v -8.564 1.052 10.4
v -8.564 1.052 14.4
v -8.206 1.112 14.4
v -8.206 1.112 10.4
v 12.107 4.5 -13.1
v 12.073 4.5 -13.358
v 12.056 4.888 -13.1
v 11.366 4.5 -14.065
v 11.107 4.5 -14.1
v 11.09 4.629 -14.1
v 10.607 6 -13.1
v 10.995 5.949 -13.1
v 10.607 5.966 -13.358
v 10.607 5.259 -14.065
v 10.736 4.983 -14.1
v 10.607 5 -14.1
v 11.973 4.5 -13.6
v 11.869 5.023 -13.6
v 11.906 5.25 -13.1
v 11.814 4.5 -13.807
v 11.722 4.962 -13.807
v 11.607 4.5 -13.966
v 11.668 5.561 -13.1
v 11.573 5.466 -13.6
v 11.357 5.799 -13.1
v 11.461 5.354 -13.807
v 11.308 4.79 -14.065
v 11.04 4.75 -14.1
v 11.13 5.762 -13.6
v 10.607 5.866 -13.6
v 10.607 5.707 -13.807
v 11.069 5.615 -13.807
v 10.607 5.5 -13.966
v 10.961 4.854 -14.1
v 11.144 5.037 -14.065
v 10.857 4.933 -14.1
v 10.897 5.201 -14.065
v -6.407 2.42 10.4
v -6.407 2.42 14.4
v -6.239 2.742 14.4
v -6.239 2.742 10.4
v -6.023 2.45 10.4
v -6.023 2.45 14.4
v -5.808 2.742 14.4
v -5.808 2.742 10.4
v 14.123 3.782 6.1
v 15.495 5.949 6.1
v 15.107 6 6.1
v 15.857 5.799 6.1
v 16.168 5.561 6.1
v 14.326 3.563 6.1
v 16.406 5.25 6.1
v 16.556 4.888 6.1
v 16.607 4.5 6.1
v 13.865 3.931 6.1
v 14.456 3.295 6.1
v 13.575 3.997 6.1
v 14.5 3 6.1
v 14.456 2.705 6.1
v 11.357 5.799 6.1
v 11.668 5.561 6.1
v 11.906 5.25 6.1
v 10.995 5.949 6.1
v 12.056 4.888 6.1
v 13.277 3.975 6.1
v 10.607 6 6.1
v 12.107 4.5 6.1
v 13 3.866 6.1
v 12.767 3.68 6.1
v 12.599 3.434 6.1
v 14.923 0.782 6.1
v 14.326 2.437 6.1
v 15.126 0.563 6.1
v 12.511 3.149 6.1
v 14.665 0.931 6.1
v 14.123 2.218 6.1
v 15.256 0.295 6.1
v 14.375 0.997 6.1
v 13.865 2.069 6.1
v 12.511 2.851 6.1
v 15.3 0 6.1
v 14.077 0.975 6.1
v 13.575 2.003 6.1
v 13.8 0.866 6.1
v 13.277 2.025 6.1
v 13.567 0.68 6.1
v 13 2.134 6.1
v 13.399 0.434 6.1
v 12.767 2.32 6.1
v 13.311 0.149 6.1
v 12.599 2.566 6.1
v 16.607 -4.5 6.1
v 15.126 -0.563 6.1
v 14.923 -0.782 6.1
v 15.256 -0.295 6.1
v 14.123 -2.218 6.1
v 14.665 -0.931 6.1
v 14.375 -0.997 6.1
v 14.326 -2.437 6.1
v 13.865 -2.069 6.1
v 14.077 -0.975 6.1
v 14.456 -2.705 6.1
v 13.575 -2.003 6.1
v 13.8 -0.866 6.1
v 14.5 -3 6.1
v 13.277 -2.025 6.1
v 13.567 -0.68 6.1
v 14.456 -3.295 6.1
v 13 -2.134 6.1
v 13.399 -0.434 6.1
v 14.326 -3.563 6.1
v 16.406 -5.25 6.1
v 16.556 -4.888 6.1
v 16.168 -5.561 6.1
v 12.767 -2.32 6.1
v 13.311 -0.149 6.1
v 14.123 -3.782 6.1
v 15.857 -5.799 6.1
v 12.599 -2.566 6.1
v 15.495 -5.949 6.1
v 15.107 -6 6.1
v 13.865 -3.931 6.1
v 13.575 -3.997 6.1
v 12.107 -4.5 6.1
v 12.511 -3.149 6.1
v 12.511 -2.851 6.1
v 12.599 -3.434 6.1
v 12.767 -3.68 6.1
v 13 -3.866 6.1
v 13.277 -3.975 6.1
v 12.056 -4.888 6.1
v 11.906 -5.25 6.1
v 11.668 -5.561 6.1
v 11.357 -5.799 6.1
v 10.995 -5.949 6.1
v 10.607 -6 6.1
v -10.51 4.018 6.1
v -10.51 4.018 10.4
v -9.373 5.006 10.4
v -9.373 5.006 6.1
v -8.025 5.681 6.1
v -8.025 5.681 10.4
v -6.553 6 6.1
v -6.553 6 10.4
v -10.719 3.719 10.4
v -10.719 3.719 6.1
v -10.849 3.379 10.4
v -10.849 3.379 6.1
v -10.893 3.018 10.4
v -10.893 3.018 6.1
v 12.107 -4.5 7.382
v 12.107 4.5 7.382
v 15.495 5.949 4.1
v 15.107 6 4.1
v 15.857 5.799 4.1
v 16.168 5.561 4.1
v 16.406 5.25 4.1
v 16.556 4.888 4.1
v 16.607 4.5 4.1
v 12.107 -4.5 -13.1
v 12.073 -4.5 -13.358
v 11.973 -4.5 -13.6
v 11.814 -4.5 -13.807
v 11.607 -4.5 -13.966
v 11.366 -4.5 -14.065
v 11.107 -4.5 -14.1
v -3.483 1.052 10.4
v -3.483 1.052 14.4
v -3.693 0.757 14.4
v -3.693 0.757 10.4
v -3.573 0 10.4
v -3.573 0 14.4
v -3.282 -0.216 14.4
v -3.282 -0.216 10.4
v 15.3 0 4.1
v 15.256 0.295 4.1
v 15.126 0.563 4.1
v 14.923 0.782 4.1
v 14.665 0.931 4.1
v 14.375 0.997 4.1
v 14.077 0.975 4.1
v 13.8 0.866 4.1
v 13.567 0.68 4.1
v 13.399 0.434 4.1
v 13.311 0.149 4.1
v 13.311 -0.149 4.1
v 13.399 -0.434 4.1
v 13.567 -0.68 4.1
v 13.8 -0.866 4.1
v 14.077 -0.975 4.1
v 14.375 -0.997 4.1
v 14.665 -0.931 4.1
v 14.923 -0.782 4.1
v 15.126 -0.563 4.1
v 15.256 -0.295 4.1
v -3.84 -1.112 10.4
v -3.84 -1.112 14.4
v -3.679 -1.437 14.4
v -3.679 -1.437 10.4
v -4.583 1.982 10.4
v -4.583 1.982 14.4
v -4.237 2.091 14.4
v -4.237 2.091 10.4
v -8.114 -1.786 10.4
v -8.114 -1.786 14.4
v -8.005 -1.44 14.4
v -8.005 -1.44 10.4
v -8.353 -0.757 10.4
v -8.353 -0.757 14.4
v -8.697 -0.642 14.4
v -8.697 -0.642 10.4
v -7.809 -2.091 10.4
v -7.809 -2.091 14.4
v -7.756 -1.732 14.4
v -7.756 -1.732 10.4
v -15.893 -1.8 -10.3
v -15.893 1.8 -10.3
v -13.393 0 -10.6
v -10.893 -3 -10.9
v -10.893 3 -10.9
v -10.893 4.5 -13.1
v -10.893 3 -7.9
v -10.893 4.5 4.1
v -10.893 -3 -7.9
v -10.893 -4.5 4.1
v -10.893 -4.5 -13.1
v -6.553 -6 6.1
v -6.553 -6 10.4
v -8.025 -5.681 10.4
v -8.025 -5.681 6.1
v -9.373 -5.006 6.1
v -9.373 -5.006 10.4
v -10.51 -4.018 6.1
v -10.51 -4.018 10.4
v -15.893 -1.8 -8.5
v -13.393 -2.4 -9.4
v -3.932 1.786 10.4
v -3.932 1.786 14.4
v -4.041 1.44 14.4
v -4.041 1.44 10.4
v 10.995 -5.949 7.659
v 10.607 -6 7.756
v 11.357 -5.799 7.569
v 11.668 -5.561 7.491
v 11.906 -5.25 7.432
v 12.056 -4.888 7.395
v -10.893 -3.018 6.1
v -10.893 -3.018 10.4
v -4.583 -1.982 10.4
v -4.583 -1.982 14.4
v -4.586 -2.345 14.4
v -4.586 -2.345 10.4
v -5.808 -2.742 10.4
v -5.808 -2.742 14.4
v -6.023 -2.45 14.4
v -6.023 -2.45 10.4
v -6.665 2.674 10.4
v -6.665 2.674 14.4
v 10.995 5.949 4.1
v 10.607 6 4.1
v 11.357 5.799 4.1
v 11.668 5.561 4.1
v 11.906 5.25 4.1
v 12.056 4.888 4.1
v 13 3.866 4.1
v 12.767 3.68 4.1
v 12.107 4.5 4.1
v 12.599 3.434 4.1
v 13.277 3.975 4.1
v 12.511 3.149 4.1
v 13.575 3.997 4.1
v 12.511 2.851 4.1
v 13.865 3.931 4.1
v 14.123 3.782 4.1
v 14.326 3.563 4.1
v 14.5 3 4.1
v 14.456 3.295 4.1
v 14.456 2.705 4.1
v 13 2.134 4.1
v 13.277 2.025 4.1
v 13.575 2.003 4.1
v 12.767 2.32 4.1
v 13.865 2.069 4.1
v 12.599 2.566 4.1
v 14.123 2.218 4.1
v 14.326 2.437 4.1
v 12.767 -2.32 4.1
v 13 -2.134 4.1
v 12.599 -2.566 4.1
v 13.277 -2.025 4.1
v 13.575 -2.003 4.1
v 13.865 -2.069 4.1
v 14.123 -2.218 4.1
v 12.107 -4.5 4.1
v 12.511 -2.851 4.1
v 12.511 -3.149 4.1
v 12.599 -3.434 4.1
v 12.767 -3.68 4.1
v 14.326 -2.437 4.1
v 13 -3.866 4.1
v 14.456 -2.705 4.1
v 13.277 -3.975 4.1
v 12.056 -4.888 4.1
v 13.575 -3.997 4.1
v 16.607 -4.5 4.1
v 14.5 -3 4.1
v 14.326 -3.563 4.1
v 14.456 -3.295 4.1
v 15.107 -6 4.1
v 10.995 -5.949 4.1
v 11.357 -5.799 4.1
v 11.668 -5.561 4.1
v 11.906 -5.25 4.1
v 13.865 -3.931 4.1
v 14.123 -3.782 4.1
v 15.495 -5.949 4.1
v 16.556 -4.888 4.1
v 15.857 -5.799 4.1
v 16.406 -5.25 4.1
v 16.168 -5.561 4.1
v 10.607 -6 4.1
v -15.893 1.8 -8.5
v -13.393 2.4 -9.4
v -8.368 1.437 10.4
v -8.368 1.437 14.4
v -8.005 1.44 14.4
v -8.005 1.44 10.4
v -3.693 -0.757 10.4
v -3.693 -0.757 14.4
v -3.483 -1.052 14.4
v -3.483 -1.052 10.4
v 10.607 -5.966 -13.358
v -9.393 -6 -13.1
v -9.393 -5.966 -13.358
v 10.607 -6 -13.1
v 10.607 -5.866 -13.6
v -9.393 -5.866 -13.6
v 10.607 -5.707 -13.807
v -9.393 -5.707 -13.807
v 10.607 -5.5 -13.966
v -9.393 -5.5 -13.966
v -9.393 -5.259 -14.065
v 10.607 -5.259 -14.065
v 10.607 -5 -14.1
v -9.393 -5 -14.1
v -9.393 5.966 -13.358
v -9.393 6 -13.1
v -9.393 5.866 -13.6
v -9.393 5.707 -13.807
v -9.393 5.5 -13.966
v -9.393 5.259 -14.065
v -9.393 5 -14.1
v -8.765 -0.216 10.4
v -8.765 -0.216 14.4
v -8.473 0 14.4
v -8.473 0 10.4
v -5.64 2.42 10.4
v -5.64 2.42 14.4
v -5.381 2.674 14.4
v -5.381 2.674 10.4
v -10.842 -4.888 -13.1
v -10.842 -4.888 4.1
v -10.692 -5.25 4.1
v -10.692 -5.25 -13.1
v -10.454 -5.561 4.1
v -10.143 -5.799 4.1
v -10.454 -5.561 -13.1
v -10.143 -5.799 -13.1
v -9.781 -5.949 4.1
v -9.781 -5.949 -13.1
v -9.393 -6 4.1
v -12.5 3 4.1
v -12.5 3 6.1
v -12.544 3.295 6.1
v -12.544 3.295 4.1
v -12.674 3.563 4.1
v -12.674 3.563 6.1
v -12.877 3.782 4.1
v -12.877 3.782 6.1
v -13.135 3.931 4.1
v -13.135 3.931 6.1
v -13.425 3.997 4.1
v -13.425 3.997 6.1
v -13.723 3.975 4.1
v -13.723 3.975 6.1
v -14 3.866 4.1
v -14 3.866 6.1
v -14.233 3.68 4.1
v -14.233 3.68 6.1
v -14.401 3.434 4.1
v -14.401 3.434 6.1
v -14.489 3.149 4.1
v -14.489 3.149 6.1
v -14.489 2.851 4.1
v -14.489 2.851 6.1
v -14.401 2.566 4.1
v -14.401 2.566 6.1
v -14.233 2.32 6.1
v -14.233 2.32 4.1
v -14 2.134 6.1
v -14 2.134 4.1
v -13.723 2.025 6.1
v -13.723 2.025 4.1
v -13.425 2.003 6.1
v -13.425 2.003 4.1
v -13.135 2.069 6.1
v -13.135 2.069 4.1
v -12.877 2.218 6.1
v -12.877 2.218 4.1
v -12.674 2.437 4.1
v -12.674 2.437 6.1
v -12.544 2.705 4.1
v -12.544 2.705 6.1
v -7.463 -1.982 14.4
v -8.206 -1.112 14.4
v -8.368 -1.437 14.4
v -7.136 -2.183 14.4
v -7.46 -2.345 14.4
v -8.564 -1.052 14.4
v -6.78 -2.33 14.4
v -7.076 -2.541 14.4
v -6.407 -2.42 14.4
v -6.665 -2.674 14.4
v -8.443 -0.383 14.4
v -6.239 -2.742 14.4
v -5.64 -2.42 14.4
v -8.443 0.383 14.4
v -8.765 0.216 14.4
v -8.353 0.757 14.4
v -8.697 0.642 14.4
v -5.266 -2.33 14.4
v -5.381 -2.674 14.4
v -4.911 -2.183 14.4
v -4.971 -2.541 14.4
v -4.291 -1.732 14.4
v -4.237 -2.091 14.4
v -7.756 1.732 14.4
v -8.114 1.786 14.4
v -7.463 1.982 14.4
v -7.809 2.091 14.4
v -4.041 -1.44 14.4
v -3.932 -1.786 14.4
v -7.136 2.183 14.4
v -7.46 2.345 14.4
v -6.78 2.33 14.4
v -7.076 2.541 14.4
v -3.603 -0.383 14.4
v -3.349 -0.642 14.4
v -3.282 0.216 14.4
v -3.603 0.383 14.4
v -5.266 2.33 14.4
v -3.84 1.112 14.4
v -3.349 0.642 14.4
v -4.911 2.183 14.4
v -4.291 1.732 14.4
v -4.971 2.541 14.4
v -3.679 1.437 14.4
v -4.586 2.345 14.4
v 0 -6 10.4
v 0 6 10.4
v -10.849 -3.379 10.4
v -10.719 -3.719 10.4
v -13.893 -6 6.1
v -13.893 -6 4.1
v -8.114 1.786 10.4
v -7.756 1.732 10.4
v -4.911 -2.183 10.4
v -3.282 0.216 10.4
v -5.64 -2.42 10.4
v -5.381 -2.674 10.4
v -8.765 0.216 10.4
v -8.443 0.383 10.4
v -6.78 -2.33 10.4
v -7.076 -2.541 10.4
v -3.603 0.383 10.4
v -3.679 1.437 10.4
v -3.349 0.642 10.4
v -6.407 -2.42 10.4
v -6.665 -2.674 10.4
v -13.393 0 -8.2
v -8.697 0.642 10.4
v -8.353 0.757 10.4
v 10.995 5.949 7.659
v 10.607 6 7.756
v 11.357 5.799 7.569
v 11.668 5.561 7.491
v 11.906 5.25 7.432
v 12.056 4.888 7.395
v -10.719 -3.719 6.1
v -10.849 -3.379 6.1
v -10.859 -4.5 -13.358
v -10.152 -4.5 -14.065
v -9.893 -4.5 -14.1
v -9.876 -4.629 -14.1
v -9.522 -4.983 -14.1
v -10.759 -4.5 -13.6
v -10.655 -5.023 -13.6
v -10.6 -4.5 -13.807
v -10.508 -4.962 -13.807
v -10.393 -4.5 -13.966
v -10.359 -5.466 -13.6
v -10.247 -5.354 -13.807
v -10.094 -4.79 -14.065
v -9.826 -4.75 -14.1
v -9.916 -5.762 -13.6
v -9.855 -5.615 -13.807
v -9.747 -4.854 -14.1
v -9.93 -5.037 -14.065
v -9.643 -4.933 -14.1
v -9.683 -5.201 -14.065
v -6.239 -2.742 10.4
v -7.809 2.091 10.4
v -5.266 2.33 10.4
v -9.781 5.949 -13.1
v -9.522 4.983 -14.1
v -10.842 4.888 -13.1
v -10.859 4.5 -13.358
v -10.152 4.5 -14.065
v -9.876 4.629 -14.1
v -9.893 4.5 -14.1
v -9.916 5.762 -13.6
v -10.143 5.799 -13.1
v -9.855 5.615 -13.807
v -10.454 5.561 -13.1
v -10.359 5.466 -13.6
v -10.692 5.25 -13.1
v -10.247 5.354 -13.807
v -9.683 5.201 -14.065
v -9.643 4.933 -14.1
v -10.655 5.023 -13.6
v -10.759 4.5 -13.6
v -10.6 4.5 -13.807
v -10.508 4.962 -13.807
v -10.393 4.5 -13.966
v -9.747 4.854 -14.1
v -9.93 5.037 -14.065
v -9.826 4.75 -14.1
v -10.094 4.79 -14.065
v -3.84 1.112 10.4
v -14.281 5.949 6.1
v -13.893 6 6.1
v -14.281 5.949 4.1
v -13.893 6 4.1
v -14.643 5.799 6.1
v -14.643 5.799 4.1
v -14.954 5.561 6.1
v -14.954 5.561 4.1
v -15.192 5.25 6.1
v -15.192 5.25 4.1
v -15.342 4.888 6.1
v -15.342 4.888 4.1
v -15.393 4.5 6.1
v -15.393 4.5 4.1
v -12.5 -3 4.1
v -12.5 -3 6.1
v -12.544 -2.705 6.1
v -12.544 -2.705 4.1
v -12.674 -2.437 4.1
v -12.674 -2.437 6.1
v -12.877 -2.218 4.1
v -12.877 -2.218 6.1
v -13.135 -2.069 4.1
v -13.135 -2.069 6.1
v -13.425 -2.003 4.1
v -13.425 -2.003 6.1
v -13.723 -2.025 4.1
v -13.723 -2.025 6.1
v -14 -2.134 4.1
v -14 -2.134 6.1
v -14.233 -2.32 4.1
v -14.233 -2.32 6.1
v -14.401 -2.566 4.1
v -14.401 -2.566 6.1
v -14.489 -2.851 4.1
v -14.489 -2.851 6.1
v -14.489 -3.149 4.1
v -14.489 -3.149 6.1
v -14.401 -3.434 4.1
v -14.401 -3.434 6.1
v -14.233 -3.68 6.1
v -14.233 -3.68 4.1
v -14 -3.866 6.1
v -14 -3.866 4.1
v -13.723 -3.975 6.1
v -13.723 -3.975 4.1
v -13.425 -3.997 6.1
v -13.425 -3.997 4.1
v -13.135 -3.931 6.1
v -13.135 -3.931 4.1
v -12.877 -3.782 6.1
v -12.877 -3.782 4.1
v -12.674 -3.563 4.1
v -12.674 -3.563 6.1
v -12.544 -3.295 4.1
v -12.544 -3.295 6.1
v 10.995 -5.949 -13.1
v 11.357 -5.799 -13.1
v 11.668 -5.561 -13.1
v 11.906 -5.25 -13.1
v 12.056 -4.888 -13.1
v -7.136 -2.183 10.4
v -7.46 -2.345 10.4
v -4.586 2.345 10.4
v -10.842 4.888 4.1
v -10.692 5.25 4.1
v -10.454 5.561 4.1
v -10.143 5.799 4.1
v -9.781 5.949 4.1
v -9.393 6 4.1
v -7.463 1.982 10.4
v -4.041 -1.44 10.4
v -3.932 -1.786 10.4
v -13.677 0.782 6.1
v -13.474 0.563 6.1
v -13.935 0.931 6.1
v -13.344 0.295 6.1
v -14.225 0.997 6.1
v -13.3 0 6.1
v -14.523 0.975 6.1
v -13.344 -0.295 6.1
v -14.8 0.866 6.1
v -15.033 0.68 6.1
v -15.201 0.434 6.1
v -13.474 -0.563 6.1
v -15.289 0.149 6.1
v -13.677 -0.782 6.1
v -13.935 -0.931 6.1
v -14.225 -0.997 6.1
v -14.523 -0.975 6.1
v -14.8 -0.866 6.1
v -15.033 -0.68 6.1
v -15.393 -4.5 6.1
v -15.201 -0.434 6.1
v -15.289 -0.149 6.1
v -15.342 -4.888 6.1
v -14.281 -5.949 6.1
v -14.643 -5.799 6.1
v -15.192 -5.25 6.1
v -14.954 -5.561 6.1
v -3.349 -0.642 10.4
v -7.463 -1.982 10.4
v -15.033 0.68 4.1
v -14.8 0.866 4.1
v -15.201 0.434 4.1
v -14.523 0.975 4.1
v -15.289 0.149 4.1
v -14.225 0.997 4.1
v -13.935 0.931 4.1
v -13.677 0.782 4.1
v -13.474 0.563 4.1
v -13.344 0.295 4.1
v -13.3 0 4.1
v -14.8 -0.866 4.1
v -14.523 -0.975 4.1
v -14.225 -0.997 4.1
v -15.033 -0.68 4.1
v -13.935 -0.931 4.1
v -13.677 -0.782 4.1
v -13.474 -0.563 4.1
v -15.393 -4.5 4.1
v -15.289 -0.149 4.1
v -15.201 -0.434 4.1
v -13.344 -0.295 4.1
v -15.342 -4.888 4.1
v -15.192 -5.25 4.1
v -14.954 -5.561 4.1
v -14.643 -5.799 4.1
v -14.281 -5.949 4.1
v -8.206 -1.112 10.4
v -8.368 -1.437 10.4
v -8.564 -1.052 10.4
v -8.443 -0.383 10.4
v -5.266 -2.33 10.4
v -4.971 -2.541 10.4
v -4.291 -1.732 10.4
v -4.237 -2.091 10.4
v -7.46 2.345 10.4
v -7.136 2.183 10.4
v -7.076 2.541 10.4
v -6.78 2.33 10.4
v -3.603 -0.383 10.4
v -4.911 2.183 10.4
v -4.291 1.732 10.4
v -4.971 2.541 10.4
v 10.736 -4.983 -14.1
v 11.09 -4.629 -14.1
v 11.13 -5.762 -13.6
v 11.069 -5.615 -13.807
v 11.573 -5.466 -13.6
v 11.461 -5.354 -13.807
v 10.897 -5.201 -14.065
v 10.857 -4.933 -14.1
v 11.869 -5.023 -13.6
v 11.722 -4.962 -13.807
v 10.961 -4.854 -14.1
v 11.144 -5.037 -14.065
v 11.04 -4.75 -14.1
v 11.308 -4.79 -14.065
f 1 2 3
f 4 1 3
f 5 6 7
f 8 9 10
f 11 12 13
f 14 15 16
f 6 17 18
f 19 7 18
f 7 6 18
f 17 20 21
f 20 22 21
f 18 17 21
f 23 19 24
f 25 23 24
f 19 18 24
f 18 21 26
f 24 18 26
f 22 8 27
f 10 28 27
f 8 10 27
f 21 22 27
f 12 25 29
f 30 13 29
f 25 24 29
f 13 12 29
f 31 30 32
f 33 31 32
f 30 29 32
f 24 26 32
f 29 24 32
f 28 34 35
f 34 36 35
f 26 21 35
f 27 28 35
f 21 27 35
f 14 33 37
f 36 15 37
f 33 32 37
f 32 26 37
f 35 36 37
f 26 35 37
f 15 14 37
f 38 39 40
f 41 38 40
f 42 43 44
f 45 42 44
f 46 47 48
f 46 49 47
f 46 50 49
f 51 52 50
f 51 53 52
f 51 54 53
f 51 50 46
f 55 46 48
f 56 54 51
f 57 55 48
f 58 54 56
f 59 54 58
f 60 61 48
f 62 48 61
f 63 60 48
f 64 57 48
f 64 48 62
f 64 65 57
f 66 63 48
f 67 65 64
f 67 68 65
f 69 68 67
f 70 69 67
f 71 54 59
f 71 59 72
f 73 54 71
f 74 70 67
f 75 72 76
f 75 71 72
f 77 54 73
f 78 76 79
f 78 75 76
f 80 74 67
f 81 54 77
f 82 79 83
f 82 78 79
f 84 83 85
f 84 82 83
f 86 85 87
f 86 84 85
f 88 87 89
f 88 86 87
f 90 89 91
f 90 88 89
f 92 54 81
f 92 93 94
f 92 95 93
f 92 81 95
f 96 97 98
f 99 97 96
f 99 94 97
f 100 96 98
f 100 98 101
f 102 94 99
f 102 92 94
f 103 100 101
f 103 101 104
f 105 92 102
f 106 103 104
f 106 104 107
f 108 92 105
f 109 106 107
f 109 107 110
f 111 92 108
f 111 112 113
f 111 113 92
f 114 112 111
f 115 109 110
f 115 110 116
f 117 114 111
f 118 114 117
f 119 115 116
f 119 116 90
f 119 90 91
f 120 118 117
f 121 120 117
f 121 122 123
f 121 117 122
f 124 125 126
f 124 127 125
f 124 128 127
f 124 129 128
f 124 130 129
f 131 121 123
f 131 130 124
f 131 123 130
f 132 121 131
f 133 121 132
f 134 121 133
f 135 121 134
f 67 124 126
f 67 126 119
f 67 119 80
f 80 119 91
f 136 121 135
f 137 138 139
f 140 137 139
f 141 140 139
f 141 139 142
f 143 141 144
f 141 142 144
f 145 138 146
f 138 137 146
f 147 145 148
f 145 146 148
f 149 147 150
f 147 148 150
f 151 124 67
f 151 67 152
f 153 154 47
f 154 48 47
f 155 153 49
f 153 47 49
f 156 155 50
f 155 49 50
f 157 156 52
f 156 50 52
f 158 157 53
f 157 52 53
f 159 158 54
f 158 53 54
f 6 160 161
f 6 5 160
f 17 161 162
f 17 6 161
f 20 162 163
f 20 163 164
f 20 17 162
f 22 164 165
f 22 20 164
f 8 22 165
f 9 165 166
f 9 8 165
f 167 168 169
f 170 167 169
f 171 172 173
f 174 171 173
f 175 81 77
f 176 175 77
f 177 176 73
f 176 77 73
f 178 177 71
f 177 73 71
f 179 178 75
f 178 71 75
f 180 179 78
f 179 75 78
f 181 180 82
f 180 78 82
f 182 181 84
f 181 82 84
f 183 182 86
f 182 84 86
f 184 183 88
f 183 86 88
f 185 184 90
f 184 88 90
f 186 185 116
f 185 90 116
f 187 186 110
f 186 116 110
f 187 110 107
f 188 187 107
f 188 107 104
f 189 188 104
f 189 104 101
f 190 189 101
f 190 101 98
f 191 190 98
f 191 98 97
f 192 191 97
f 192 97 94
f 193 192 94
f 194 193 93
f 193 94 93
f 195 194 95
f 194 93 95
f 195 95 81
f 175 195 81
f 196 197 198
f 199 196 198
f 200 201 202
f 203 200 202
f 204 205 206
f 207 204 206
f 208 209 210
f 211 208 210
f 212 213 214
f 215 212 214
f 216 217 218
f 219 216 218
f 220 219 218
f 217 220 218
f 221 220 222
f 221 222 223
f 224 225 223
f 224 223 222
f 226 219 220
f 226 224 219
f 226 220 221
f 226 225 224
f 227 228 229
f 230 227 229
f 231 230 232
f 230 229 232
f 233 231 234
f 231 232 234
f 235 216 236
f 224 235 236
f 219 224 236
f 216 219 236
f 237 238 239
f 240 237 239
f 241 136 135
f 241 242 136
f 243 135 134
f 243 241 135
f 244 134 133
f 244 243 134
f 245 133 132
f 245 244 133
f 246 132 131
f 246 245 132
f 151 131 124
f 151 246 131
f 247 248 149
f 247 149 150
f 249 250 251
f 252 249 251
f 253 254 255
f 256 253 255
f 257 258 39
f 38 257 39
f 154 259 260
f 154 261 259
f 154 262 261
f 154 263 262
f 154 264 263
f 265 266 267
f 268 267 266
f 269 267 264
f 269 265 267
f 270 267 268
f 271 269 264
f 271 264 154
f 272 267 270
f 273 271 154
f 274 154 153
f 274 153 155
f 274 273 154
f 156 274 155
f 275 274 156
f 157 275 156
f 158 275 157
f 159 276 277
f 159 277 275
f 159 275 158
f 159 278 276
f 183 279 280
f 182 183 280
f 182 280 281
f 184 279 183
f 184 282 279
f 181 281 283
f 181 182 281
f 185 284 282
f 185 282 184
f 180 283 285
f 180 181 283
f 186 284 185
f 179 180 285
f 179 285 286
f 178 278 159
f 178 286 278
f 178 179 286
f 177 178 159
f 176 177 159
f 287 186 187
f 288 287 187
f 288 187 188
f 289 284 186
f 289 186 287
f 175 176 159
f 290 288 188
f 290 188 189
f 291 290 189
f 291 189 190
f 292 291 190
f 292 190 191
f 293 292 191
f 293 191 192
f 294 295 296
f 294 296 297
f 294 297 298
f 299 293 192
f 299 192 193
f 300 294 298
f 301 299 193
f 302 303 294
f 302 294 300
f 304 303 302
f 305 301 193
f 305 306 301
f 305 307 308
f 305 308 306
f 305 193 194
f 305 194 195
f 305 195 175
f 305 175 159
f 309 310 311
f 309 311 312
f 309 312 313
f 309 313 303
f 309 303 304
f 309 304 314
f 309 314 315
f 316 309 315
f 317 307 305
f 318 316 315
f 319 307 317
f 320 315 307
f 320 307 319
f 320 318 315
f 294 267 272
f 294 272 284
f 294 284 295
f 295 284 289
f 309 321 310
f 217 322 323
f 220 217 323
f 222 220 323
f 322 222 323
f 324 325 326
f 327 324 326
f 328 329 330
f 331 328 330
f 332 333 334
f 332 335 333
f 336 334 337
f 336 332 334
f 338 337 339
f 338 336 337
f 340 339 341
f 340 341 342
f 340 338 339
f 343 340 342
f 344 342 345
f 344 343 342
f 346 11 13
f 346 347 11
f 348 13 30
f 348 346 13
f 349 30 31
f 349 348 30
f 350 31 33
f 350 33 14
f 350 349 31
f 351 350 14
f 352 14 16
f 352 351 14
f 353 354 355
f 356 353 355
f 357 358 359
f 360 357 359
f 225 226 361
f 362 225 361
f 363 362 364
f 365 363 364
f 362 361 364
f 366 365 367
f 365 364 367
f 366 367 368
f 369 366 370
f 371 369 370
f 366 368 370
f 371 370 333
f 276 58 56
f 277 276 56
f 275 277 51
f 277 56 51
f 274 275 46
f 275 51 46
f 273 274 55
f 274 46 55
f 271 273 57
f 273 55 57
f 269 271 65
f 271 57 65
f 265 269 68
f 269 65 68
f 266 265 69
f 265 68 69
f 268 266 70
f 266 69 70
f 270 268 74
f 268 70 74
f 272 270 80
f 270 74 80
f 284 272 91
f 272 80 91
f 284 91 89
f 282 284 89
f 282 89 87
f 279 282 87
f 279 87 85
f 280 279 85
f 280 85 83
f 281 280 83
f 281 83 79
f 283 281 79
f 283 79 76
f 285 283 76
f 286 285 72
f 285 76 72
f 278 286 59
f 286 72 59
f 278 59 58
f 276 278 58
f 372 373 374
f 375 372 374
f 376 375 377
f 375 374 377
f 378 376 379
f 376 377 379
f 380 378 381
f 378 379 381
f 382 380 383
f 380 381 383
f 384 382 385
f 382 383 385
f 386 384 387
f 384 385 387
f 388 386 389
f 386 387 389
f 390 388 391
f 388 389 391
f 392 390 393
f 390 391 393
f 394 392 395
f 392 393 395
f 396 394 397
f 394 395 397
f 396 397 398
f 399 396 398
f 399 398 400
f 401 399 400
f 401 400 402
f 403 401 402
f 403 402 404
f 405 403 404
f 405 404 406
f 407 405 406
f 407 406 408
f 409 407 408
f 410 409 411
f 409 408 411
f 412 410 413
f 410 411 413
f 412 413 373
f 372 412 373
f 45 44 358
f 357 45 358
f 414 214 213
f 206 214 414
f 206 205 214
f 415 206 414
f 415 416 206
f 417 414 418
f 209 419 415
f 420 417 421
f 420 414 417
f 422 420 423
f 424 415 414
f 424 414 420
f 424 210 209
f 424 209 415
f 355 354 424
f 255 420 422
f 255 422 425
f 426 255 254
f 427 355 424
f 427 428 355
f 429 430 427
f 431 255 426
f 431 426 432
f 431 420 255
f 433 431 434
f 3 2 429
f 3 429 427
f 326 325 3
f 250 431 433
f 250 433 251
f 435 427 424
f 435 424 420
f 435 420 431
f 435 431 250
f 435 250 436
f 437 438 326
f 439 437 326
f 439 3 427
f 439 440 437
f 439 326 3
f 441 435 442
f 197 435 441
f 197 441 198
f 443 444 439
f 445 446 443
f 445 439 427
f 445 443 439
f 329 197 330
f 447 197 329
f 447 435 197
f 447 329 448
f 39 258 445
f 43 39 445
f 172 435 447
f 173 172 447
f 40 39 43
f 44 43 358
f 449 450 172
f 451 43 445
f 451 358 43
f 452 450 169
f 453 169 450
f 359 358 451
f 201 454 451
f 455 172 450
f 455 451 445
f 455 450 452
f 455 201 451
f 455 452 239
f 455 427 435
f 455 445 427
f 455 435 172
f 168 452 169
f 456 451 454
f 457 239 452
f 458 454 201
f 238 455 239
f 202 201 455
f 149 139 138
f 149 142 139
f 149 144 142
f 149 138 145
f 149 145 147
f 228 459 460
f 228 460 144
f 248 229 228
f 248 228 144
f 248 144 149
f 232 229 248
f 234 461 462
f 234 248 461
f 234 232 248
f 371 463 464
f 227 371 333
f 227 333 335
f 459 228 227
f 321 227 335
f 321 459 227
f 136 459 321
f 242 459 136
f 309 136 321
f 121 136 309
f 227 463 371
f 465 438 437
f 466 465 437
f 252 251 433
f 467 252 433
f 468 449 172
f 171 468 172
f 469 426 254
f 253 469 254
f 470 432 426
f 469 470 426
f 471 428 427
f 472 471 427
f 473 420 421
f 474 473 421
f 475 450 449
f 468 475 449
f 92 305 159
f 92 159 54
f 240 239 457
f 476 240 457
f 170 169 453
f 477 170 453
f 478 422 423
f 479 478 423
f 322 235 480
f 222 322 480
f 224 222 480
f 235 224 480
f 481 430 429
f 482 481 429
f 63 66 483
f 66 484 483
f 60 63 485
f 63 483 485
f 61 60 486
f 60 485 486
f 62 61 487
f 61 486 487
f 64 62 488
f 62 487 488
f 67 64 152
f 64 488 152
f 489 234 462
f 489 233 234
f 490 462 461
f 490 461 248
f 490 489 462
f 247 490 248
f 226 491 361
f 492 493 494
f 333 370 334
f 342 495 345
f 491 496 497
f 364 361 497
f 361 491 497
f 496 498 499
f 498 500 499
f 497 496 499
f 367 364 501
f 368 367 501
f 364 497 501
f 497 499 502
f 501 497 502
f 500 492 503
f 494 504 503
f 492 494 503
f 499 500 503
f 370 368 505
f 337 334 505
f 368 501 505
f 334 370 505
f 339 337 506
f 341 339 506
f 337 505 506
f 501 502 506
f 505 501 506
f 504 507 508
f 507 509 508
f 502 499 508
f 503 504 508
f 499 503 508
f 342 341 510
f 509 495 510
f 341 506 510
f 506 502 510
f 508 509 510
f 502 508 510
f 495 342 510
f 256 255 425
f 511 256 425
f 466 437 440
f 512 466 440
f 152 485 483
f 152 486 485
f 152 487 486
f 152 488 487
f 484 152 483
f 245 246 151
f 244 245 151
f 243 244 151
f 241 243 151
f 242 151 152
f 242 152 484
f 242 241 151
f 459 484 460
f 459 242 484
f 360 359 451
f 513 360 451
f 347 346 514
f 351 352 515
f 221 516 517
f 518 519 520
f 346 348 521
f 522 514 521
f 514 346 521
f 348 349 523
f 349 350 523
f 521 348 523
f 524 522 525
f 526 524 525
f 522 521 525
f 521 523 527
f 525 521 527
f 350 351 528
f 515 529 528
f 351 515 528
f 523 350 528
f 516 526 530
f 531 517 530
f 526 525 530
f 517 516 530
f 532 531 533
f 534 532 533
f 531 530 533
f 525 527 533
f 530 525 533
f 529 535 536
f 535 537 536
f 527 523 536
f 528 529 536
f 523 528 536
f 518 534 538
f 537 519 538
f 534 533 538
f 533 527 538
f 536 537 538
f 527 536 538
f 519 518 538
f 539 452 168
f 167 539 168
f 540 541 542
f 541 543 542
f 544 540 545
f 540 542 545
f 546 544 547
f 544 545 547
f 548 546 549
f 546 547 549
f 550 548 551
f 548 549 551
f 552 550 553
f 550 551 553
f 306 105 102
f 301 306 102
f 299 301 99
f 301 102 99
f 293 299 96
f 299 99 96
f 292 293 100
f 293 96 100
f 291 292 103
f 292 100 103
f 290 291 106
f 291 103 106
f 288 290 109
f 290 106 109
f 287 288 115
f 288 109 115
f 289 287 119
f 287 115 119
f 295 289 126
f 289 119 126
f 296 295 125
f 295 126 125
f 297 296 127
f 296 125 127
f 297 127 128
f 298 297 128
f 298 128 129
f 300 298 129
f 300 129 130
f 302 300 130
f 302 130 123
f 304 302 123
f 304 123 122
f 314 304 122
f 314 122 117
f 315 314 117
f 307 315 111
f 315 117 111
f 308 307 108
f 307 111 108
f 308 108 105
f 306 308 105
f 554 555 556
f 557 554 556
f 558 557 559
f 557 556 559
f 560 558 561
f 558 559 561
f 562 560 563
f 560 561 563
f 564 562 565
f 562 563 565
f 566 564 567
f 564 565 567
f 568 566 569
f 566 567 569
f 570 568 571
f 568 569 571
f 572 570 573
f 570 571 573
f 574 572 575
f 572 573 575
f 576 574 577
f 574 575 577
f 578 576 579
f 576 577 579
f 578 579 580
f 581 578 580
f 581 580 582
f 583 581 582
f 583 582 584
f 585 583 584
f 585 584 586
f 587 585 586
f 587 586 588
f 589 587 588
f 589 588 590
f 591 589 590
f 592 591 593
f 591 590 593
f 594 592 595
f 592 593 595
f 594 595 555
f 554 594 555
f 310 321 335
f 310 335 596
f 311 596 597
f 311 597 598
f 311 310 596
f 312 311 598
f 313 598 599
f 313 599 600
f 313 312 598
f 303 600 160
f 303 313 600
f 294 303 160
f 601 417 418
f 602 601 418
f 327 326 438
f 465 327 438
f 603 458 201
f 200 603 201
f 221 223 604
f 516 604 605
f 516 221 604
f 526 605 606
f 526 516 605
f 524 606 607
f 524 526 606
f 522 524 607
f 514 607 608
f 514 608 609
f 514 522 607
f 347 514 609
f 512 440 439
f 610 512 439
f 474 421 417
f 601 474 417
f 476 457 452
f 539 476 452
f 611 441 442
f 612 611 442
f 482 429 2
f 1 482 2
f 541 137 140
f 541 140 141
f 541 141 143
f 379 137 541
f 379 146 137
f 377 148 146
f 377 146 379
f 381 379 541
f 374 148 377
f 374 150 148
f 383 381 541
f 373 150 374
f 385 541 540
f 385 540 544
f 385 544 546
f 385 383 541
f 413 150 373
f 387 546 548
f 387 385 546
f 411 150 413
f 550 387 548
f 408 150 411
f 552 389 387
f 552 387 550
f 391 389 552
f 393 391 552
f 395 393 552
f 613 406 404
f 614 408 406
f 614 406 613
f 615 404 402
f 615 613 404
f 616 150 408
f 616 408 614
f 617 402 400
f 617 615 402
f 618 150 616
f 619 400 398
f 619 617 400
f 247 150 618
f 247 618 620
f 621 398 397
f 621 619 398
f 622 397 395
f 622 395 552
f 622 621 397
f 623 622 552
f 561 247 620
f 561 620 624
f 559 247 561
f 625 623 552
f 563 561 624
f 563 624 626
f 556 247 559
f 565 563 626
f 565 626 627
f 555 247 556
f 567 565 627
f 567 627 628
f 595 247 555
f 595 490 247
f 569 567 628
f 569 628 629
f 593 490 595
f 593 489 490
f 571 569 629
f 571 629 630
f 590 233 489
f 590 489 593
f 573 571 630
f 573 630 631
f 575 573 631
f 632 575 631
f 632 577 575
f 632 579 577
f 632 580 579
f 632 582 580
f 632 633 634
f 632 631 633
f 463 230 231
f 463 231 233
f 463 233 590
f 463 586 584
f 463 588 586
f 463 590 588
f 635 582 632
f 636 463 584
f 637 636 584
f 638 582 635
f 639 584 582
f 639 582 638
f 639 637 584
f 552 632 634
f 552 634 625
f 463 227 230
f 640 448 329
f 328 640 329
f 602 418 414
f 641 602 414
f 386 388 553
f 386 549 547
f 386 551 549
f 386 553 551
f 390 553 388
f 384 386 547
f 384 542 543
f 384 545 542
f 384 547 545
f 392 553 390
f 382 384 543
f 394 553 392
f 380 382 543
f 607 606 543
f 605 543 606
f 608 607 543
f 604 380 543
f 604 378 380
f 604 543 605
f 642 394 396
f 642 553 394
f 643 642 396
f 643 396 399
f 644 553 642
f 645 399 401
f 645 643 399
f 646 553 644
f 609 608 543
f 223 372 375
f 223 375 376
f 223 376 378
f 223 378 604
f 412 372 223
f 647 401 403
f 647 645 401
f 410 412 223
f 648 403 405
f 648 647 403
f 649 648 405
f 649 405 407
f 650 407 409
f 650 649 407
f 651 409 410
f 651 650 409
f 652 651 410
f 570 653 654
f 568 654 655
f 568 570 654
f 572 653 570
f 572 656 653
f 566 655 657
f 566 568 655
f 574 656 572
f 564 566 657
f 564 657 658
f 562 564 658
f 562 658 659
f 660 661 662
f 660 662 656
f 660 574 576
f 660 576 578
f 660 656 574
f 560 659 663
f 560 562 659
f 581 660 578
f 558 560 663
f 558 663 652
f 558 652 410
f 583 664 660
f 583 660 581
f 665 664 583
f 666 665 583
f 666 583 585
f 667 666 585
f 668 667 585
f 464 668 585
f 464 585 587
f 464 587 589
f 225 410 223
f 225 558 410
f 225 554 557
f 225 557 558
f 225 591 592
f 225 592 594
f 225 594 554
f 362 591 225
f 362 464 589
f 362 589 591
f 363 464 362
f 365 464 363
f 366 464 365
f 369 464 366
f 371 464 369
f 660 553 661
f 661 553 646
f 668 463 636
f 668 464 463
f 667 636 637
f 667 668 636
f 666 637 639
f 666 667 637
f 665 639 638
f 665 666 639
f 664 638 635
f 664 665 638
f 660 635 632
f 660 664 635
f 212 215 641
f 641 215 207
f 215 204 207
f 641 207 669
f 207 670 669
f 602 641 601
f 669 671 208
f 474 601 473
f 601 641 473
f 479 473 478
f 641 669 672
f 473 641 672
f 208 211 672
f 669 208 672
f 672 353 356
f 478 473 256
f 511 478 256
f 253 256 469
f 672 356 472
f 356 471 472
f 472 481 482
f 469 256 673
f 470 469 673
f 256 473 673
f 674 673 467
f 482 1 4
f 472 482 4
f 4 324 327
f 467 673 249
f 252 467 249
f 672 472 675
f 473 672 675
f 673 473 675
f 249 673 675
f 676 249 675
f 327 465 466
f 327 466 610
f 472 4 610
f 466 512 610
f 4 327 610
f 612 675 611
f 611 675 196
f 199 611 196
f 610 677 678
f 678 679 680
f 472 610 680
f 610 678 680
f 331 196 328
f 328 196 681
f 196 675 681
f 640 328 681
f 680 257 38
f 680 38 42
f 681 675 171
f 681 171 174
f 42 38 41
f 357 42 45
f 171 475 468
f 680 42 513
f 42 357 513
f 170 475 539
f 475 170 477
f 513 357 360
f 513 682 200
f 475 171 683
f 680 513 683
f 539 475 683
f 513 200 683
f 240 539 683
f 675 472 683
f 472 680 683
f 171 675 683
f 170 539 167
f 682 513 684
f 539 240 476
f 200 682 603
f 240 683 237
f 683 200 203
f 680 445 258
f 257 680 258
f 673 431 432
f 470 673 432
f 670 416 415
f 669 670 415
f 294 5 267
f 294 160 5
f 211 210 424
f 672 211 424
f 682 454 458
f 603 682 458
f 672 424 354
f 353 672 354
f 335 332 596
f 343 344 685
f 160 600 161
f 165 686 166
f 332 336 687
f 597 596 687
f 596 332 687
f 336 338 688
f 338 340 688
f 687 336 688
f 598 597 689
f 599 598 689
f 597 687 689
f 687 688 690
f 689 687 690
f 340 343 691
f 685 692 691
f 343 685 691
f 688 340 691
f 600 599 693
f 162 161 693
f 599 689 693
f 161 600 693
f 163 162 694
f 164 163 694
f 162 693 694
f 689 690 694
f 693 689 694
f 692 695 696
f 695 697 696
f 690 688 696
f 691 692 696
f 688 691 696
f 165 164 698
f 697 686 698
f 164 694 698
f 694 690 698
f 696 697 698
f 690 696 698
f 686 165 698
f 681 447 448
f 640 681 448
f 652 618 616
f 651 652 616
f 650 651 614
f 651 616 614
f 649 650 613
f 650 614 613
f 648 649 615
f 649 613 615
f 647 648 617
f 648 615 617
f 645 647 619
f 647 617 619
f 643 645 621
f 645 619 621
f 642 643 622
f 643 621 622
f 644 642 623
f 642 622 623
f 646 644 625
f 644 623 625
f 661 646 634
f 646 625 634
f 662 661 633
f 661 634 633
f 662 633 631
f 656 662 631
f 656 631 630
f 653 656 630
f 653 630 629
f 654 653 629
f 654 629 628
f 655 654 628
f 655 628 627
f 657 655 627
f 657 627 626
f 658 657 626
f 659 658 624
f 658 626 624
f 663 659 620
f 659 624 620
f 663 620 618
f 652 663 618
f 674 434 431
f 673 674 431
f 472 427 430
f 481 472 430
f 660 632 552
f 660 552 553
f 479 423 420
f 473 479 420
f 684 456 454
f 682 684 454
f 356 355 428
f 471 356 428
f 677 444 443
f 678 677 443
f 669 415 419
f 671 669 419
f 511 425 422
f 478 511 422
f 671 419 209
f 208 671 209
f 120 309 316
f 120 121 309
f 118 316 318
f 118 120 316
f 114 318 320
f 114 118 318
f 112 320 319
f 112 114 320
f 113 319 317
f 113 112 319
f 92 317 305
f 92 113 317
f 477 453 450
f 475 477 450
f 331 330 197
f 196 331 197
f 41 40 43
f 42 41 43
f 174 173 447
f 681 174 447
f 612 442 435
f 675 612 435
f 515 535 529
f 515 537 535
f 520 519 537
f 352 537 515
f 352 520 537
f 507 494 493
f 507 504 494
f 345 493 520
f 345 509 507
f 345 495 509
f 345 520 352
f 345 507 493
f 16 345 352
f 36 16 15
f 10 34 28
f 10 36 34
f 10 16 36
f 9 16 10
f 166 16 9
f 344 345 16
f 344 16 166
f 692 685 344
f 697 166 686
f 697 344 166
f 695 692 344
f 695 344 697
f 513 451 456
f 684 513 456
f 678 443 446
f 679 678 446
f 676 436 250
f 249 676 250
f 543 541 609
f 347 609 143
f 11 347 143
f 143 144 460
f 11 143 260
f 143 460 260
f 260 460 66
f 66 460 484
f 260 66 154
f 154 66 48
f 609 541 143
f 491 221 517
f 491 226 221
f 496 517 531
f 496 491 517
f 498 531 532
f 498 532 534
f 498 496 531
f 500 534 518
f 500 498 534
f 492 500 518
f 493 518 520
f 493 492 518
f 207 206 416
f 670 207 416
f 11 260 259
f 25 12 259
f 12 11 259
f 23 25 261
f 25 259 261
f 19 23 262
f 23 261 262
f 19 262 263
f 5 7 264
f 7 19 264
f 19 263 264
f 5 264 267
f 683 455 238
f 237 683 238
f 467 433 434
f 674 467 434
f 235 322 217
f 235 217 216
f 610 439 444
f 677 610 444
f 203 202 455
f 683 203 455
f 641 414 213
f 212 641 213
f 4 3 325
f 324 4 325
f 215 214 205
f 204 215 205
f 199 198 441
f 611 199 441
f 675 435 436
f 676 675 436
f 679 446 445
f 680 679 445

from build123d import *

# Parameters (mm, degrees)
F2_DEPTH  = 6
F4_R      = 1
F5_DEPTH  = 2
F7_DEPTH  = 4.3
F8_R      = 2.75
F9_DEPTH  = 4
F10_R     = 7.75
F11_DEPTH = 4
F14_W     = 3.6
F14_H     = 1.8
F12_W     = 6
F12_H     = 3
F16_R     = 1.5
F17_R     = 1


with BuildPart() as f2:
    # F1 (on Front) → F2 (new body, symmetric)
    with BuildSketch(Plane.XZ):
        Polygon((-10.8929648995, 4.1004477039), (-10.8929648995, -14.0995522961), (12.1070351005, -14.0995522961), (12.1070351005, 4.1004477039), (16.6070351005, 4.1004477039), (16.6070351005, 6.1004477039), (12.1070351005, 6.1004477039), (12.1070351005, 7.3818248219), (0, 10.4004477039), (-10.8929648995, 10.4004477039), (-10.8929648995, 6.1004477039), (-15.3929648995, 6.1004477039), (-15.3929648995, 4.1004477039), align=None)
    extrude(amount=F2_DEPTH, both=True)

    # F4 (on offset) → F5 (cut, through all)
    with BuildSketch(Plane.XY.offset(6.1004477039)):
        with Locations((-13.5, 3)):
            Circle(F4_R)
        with Locations((-13.5, -3)):
            Circle(F4_R)
        with Locations((13.5, 3)):
            Circle(F4_R)
        with Locations((13.5, -3)):
            Circle(F4_R)
        with Locations((-14.3, 0)):
            Circle(F4_R)
        with Locations((14.3, 0)):
            Circle(F4_R)
    extrude(amount=-F5_DEPTH, mode=Mode.SUBTRACT)

    # F6 (on face) → F7 (cut, through all)
    with BuildSketch(Plane.XY.offset(10.4004477039)):
        with BuildLine():
            ThreePointArc((-10.8929648995, 3.544917937), (-8.9887550703, 5.242725125), (-6.5525491912, 6))
            Line((-6.5525491912, 6), (-10.8929648995, 6))
            Line((-10.8929648995, 6), (-10.8929648995, 3.544917937))
        make_face()
        with BuildLine():
            Line((-10.8929648995, -6), (-6.5525491912, -6))
            ThreePointArc((-6.5525491912, -6), (-8.9887550703, -5.242725125), (-10.8929648995, -3.544917937))
            Line((-10.8929648995, -3.544917937), (-10.8929648995, -6))
        make_face()
    extrude(amount=-F7_DEPTH, mode=Mode.SUBTRACT)

    # F14 (on offset) → F15 section 0
    with BuildSketch(Plane(origin=(-15.8929648995, 0, 0), x_dir=(0, -1, 0), z_dir=(-1, 0, 0))):
        with Locations((0, -9.3995522961)):
            Rectangle(F14_W, F14_H)
    # F12 (on face) → F15 section 1
    with BuildSketch(Plane(origin=(-10.8929648995, 0, 0), x_dir=(0, -1, 0), z_dir=(-1, 0, 0))):
        with Locations((0, -9.3995522961)):
            Rectangle(F12_W, F12_H)
    loft()

    # F16
    f16_edges = [f2.edges().sort_by_distance(p)[0] for p in [
        (-15.392965, -6, 5.100448),
        (-15.392965, 6, 5.100448),
        (-10.892965, -3.544918, 8.250448),
        (-10.892965, 3.544918, 8.250448),
        (16.607035, -6, 5.100448),
        (16.607035, 6, 5.100448),
        (12.107035, -6, -4.999552),
        (12.107035, -6, 6.741136),
        (12.107035, 6, 6.741136),
        (12.107035, 6, -4.999552),
        (-10.892965, 6, -4.999552),
        (-10.892965, -6, -4.999552),
    ]]
    fillet(f16_edges, radius=F16_R)

    # F17
    f17_edges = [f2.edges().sort_by_distance(p)[0] for p in [
        (-10.892965, 0, -14.099552),
        (-10.453625, 5.56066, -14.099552),
        (-10.453625, -5.56066, -14.099552),
        (0.607035, 6, -14.099552),
        (0.607035, -6, -14.099552),
        (11.667695, 5.56066, -14.099552),
        (11.667695, -5.56066, -14.099552),
        (12.107035, 0, -14.099552),
    ]]
    fillet(f17_edges, radius=F17_R)


with BuildPart() as f9:
    # F8 (on face) → F9 (new body)
    with BuildSketch(Plane.XY.offset(10.4004477039)):
        with Locations((-6.0232970864, 0)):
            Circle(F8_R)
    extrude(amount=F9_DEPTH)

    # F10 (on face) → F11 (cut, through all)
    with BuildSketch(Plane.XY.offset(14.4004477039)):
        with Locations((-6.0232970864, 0)):
            Circle(F10_R)
        Polygon((-6.4065615257, 2.4198364345), (-6.2390595996, 2.7415226678), (-6.0232970864, 2.45), (-5.8075345731, 2.7415226678), (-5.640032647, 2.4198364345), (-5.3813223358, 2.6740172811), (-5.2662054501, 2.3300884649), (-4.9709176474, 2.5406687144), (-4.911020362, 2.1829659843), (-4.5864260334, 2.344760452), (-4.5832232182, 1.9820916362), (-4.2373149535, 2.0911164054), (-4.2908854725, 1.7324116139), (-3.932180681, 1.7859821329), (-4.0412054501, 1.4400738681), (-3.6785366344, 1.436871053), (-3.8403311021, 1.1122767244), (-3.482628372, 1.052379439), (-3.6932086214, 0.7570916362), (-3.3492798053, 0.6419747506), (-3.6034606519, 0.3832644393), (-3.2817744186, 0.2157625133), (-3.5732970864, 0), (-3.2817744186, -0.2157625133), (-3.6034606519, -0.3832644393), (-3.3492798053, -0.6419747506), (-3.6932086214, -0.7570916362), (-3.482628372, -1.052379439), (-3.8403311021, -1.1122767244), (-3.6785366344, -1.436871053), (-4.0412054501, -1.4400738681), (-3.932180681, -1.7859821329), (-4.2908854725, -1.7324116139), (-4.2373149535, -2.0911164054), (-4.5832232182, -1.9820916362), (-4.5864260334, -2.344760452), (-4.911020362, -2.1829659843), (-4.9709176474, -2.5406687144), (-5.2662054501, -2.3300884649), (-5.3813223358, -2.6740172811), (-5.640032647, -2.4198364345), (-5.8075345731, -2.7415226678), (-6.0232970864, -2.45), (-6.2390595996, -2.7415226678), (-6.4065615257, -2.4198364345), (-6.665271837, -2.6740172811), (-6.7803887226, -2.3300884649), (-7.0756765254, -2.5406687144), (-7.1355738107, -2.1829659843), (-7.4601681393, -2.344760452), (-7.4633709545, -1.9820916362), (-7.8092792193, -2.0911164054), (-7.7557087003, -1.7324116139), (-8.1144134918, -1.7859821329), (-8.0053887226, -1.4400738681), (-8.3680575383, -1.436871053), (-8.2062630706, -1.1122767244), (-8.5639658008, -1.052379439), (-8.3533855513, -0.7570916362), (-8.6973143675, -0.6419747506), (-8.4431335208, -0.3832644393), (-8.7648197541, -0.2157625133), (-8.4732970864, 0), (-8.7648197541, 0.2157625133), (-8.4431335208, 0.3832644393), (-8.6973143675, 0.6419747506), (-8.3533855513, 0.7570916362), (-8.5639658008, 1.052379439), (-8.2062630706, 1.1122767244), (-8.3680575383, 1.436871053), (-8.0053887226, 1.4400738681), (-8.1144134918, 1.7859821329), (-7.7557087003, 1.7324116139), (-7.8092792193, 2.0911164054), (-7.4633709545, 1.9820916362), (-7.4601681393, 2.344760452), (-7.1355738107, 2.1829659843), (-7.0756765254, 2.5406687144), (-6.7803887226, 2.3300884649), (-6.665271837, 2.6740172811), align=None, mode=Mode.SUBTRACT)
    extrude(amount=-F11_DEPTH, mode=Mode.SUBTRACT)


solid = Compound([f2.part, f9.part])
